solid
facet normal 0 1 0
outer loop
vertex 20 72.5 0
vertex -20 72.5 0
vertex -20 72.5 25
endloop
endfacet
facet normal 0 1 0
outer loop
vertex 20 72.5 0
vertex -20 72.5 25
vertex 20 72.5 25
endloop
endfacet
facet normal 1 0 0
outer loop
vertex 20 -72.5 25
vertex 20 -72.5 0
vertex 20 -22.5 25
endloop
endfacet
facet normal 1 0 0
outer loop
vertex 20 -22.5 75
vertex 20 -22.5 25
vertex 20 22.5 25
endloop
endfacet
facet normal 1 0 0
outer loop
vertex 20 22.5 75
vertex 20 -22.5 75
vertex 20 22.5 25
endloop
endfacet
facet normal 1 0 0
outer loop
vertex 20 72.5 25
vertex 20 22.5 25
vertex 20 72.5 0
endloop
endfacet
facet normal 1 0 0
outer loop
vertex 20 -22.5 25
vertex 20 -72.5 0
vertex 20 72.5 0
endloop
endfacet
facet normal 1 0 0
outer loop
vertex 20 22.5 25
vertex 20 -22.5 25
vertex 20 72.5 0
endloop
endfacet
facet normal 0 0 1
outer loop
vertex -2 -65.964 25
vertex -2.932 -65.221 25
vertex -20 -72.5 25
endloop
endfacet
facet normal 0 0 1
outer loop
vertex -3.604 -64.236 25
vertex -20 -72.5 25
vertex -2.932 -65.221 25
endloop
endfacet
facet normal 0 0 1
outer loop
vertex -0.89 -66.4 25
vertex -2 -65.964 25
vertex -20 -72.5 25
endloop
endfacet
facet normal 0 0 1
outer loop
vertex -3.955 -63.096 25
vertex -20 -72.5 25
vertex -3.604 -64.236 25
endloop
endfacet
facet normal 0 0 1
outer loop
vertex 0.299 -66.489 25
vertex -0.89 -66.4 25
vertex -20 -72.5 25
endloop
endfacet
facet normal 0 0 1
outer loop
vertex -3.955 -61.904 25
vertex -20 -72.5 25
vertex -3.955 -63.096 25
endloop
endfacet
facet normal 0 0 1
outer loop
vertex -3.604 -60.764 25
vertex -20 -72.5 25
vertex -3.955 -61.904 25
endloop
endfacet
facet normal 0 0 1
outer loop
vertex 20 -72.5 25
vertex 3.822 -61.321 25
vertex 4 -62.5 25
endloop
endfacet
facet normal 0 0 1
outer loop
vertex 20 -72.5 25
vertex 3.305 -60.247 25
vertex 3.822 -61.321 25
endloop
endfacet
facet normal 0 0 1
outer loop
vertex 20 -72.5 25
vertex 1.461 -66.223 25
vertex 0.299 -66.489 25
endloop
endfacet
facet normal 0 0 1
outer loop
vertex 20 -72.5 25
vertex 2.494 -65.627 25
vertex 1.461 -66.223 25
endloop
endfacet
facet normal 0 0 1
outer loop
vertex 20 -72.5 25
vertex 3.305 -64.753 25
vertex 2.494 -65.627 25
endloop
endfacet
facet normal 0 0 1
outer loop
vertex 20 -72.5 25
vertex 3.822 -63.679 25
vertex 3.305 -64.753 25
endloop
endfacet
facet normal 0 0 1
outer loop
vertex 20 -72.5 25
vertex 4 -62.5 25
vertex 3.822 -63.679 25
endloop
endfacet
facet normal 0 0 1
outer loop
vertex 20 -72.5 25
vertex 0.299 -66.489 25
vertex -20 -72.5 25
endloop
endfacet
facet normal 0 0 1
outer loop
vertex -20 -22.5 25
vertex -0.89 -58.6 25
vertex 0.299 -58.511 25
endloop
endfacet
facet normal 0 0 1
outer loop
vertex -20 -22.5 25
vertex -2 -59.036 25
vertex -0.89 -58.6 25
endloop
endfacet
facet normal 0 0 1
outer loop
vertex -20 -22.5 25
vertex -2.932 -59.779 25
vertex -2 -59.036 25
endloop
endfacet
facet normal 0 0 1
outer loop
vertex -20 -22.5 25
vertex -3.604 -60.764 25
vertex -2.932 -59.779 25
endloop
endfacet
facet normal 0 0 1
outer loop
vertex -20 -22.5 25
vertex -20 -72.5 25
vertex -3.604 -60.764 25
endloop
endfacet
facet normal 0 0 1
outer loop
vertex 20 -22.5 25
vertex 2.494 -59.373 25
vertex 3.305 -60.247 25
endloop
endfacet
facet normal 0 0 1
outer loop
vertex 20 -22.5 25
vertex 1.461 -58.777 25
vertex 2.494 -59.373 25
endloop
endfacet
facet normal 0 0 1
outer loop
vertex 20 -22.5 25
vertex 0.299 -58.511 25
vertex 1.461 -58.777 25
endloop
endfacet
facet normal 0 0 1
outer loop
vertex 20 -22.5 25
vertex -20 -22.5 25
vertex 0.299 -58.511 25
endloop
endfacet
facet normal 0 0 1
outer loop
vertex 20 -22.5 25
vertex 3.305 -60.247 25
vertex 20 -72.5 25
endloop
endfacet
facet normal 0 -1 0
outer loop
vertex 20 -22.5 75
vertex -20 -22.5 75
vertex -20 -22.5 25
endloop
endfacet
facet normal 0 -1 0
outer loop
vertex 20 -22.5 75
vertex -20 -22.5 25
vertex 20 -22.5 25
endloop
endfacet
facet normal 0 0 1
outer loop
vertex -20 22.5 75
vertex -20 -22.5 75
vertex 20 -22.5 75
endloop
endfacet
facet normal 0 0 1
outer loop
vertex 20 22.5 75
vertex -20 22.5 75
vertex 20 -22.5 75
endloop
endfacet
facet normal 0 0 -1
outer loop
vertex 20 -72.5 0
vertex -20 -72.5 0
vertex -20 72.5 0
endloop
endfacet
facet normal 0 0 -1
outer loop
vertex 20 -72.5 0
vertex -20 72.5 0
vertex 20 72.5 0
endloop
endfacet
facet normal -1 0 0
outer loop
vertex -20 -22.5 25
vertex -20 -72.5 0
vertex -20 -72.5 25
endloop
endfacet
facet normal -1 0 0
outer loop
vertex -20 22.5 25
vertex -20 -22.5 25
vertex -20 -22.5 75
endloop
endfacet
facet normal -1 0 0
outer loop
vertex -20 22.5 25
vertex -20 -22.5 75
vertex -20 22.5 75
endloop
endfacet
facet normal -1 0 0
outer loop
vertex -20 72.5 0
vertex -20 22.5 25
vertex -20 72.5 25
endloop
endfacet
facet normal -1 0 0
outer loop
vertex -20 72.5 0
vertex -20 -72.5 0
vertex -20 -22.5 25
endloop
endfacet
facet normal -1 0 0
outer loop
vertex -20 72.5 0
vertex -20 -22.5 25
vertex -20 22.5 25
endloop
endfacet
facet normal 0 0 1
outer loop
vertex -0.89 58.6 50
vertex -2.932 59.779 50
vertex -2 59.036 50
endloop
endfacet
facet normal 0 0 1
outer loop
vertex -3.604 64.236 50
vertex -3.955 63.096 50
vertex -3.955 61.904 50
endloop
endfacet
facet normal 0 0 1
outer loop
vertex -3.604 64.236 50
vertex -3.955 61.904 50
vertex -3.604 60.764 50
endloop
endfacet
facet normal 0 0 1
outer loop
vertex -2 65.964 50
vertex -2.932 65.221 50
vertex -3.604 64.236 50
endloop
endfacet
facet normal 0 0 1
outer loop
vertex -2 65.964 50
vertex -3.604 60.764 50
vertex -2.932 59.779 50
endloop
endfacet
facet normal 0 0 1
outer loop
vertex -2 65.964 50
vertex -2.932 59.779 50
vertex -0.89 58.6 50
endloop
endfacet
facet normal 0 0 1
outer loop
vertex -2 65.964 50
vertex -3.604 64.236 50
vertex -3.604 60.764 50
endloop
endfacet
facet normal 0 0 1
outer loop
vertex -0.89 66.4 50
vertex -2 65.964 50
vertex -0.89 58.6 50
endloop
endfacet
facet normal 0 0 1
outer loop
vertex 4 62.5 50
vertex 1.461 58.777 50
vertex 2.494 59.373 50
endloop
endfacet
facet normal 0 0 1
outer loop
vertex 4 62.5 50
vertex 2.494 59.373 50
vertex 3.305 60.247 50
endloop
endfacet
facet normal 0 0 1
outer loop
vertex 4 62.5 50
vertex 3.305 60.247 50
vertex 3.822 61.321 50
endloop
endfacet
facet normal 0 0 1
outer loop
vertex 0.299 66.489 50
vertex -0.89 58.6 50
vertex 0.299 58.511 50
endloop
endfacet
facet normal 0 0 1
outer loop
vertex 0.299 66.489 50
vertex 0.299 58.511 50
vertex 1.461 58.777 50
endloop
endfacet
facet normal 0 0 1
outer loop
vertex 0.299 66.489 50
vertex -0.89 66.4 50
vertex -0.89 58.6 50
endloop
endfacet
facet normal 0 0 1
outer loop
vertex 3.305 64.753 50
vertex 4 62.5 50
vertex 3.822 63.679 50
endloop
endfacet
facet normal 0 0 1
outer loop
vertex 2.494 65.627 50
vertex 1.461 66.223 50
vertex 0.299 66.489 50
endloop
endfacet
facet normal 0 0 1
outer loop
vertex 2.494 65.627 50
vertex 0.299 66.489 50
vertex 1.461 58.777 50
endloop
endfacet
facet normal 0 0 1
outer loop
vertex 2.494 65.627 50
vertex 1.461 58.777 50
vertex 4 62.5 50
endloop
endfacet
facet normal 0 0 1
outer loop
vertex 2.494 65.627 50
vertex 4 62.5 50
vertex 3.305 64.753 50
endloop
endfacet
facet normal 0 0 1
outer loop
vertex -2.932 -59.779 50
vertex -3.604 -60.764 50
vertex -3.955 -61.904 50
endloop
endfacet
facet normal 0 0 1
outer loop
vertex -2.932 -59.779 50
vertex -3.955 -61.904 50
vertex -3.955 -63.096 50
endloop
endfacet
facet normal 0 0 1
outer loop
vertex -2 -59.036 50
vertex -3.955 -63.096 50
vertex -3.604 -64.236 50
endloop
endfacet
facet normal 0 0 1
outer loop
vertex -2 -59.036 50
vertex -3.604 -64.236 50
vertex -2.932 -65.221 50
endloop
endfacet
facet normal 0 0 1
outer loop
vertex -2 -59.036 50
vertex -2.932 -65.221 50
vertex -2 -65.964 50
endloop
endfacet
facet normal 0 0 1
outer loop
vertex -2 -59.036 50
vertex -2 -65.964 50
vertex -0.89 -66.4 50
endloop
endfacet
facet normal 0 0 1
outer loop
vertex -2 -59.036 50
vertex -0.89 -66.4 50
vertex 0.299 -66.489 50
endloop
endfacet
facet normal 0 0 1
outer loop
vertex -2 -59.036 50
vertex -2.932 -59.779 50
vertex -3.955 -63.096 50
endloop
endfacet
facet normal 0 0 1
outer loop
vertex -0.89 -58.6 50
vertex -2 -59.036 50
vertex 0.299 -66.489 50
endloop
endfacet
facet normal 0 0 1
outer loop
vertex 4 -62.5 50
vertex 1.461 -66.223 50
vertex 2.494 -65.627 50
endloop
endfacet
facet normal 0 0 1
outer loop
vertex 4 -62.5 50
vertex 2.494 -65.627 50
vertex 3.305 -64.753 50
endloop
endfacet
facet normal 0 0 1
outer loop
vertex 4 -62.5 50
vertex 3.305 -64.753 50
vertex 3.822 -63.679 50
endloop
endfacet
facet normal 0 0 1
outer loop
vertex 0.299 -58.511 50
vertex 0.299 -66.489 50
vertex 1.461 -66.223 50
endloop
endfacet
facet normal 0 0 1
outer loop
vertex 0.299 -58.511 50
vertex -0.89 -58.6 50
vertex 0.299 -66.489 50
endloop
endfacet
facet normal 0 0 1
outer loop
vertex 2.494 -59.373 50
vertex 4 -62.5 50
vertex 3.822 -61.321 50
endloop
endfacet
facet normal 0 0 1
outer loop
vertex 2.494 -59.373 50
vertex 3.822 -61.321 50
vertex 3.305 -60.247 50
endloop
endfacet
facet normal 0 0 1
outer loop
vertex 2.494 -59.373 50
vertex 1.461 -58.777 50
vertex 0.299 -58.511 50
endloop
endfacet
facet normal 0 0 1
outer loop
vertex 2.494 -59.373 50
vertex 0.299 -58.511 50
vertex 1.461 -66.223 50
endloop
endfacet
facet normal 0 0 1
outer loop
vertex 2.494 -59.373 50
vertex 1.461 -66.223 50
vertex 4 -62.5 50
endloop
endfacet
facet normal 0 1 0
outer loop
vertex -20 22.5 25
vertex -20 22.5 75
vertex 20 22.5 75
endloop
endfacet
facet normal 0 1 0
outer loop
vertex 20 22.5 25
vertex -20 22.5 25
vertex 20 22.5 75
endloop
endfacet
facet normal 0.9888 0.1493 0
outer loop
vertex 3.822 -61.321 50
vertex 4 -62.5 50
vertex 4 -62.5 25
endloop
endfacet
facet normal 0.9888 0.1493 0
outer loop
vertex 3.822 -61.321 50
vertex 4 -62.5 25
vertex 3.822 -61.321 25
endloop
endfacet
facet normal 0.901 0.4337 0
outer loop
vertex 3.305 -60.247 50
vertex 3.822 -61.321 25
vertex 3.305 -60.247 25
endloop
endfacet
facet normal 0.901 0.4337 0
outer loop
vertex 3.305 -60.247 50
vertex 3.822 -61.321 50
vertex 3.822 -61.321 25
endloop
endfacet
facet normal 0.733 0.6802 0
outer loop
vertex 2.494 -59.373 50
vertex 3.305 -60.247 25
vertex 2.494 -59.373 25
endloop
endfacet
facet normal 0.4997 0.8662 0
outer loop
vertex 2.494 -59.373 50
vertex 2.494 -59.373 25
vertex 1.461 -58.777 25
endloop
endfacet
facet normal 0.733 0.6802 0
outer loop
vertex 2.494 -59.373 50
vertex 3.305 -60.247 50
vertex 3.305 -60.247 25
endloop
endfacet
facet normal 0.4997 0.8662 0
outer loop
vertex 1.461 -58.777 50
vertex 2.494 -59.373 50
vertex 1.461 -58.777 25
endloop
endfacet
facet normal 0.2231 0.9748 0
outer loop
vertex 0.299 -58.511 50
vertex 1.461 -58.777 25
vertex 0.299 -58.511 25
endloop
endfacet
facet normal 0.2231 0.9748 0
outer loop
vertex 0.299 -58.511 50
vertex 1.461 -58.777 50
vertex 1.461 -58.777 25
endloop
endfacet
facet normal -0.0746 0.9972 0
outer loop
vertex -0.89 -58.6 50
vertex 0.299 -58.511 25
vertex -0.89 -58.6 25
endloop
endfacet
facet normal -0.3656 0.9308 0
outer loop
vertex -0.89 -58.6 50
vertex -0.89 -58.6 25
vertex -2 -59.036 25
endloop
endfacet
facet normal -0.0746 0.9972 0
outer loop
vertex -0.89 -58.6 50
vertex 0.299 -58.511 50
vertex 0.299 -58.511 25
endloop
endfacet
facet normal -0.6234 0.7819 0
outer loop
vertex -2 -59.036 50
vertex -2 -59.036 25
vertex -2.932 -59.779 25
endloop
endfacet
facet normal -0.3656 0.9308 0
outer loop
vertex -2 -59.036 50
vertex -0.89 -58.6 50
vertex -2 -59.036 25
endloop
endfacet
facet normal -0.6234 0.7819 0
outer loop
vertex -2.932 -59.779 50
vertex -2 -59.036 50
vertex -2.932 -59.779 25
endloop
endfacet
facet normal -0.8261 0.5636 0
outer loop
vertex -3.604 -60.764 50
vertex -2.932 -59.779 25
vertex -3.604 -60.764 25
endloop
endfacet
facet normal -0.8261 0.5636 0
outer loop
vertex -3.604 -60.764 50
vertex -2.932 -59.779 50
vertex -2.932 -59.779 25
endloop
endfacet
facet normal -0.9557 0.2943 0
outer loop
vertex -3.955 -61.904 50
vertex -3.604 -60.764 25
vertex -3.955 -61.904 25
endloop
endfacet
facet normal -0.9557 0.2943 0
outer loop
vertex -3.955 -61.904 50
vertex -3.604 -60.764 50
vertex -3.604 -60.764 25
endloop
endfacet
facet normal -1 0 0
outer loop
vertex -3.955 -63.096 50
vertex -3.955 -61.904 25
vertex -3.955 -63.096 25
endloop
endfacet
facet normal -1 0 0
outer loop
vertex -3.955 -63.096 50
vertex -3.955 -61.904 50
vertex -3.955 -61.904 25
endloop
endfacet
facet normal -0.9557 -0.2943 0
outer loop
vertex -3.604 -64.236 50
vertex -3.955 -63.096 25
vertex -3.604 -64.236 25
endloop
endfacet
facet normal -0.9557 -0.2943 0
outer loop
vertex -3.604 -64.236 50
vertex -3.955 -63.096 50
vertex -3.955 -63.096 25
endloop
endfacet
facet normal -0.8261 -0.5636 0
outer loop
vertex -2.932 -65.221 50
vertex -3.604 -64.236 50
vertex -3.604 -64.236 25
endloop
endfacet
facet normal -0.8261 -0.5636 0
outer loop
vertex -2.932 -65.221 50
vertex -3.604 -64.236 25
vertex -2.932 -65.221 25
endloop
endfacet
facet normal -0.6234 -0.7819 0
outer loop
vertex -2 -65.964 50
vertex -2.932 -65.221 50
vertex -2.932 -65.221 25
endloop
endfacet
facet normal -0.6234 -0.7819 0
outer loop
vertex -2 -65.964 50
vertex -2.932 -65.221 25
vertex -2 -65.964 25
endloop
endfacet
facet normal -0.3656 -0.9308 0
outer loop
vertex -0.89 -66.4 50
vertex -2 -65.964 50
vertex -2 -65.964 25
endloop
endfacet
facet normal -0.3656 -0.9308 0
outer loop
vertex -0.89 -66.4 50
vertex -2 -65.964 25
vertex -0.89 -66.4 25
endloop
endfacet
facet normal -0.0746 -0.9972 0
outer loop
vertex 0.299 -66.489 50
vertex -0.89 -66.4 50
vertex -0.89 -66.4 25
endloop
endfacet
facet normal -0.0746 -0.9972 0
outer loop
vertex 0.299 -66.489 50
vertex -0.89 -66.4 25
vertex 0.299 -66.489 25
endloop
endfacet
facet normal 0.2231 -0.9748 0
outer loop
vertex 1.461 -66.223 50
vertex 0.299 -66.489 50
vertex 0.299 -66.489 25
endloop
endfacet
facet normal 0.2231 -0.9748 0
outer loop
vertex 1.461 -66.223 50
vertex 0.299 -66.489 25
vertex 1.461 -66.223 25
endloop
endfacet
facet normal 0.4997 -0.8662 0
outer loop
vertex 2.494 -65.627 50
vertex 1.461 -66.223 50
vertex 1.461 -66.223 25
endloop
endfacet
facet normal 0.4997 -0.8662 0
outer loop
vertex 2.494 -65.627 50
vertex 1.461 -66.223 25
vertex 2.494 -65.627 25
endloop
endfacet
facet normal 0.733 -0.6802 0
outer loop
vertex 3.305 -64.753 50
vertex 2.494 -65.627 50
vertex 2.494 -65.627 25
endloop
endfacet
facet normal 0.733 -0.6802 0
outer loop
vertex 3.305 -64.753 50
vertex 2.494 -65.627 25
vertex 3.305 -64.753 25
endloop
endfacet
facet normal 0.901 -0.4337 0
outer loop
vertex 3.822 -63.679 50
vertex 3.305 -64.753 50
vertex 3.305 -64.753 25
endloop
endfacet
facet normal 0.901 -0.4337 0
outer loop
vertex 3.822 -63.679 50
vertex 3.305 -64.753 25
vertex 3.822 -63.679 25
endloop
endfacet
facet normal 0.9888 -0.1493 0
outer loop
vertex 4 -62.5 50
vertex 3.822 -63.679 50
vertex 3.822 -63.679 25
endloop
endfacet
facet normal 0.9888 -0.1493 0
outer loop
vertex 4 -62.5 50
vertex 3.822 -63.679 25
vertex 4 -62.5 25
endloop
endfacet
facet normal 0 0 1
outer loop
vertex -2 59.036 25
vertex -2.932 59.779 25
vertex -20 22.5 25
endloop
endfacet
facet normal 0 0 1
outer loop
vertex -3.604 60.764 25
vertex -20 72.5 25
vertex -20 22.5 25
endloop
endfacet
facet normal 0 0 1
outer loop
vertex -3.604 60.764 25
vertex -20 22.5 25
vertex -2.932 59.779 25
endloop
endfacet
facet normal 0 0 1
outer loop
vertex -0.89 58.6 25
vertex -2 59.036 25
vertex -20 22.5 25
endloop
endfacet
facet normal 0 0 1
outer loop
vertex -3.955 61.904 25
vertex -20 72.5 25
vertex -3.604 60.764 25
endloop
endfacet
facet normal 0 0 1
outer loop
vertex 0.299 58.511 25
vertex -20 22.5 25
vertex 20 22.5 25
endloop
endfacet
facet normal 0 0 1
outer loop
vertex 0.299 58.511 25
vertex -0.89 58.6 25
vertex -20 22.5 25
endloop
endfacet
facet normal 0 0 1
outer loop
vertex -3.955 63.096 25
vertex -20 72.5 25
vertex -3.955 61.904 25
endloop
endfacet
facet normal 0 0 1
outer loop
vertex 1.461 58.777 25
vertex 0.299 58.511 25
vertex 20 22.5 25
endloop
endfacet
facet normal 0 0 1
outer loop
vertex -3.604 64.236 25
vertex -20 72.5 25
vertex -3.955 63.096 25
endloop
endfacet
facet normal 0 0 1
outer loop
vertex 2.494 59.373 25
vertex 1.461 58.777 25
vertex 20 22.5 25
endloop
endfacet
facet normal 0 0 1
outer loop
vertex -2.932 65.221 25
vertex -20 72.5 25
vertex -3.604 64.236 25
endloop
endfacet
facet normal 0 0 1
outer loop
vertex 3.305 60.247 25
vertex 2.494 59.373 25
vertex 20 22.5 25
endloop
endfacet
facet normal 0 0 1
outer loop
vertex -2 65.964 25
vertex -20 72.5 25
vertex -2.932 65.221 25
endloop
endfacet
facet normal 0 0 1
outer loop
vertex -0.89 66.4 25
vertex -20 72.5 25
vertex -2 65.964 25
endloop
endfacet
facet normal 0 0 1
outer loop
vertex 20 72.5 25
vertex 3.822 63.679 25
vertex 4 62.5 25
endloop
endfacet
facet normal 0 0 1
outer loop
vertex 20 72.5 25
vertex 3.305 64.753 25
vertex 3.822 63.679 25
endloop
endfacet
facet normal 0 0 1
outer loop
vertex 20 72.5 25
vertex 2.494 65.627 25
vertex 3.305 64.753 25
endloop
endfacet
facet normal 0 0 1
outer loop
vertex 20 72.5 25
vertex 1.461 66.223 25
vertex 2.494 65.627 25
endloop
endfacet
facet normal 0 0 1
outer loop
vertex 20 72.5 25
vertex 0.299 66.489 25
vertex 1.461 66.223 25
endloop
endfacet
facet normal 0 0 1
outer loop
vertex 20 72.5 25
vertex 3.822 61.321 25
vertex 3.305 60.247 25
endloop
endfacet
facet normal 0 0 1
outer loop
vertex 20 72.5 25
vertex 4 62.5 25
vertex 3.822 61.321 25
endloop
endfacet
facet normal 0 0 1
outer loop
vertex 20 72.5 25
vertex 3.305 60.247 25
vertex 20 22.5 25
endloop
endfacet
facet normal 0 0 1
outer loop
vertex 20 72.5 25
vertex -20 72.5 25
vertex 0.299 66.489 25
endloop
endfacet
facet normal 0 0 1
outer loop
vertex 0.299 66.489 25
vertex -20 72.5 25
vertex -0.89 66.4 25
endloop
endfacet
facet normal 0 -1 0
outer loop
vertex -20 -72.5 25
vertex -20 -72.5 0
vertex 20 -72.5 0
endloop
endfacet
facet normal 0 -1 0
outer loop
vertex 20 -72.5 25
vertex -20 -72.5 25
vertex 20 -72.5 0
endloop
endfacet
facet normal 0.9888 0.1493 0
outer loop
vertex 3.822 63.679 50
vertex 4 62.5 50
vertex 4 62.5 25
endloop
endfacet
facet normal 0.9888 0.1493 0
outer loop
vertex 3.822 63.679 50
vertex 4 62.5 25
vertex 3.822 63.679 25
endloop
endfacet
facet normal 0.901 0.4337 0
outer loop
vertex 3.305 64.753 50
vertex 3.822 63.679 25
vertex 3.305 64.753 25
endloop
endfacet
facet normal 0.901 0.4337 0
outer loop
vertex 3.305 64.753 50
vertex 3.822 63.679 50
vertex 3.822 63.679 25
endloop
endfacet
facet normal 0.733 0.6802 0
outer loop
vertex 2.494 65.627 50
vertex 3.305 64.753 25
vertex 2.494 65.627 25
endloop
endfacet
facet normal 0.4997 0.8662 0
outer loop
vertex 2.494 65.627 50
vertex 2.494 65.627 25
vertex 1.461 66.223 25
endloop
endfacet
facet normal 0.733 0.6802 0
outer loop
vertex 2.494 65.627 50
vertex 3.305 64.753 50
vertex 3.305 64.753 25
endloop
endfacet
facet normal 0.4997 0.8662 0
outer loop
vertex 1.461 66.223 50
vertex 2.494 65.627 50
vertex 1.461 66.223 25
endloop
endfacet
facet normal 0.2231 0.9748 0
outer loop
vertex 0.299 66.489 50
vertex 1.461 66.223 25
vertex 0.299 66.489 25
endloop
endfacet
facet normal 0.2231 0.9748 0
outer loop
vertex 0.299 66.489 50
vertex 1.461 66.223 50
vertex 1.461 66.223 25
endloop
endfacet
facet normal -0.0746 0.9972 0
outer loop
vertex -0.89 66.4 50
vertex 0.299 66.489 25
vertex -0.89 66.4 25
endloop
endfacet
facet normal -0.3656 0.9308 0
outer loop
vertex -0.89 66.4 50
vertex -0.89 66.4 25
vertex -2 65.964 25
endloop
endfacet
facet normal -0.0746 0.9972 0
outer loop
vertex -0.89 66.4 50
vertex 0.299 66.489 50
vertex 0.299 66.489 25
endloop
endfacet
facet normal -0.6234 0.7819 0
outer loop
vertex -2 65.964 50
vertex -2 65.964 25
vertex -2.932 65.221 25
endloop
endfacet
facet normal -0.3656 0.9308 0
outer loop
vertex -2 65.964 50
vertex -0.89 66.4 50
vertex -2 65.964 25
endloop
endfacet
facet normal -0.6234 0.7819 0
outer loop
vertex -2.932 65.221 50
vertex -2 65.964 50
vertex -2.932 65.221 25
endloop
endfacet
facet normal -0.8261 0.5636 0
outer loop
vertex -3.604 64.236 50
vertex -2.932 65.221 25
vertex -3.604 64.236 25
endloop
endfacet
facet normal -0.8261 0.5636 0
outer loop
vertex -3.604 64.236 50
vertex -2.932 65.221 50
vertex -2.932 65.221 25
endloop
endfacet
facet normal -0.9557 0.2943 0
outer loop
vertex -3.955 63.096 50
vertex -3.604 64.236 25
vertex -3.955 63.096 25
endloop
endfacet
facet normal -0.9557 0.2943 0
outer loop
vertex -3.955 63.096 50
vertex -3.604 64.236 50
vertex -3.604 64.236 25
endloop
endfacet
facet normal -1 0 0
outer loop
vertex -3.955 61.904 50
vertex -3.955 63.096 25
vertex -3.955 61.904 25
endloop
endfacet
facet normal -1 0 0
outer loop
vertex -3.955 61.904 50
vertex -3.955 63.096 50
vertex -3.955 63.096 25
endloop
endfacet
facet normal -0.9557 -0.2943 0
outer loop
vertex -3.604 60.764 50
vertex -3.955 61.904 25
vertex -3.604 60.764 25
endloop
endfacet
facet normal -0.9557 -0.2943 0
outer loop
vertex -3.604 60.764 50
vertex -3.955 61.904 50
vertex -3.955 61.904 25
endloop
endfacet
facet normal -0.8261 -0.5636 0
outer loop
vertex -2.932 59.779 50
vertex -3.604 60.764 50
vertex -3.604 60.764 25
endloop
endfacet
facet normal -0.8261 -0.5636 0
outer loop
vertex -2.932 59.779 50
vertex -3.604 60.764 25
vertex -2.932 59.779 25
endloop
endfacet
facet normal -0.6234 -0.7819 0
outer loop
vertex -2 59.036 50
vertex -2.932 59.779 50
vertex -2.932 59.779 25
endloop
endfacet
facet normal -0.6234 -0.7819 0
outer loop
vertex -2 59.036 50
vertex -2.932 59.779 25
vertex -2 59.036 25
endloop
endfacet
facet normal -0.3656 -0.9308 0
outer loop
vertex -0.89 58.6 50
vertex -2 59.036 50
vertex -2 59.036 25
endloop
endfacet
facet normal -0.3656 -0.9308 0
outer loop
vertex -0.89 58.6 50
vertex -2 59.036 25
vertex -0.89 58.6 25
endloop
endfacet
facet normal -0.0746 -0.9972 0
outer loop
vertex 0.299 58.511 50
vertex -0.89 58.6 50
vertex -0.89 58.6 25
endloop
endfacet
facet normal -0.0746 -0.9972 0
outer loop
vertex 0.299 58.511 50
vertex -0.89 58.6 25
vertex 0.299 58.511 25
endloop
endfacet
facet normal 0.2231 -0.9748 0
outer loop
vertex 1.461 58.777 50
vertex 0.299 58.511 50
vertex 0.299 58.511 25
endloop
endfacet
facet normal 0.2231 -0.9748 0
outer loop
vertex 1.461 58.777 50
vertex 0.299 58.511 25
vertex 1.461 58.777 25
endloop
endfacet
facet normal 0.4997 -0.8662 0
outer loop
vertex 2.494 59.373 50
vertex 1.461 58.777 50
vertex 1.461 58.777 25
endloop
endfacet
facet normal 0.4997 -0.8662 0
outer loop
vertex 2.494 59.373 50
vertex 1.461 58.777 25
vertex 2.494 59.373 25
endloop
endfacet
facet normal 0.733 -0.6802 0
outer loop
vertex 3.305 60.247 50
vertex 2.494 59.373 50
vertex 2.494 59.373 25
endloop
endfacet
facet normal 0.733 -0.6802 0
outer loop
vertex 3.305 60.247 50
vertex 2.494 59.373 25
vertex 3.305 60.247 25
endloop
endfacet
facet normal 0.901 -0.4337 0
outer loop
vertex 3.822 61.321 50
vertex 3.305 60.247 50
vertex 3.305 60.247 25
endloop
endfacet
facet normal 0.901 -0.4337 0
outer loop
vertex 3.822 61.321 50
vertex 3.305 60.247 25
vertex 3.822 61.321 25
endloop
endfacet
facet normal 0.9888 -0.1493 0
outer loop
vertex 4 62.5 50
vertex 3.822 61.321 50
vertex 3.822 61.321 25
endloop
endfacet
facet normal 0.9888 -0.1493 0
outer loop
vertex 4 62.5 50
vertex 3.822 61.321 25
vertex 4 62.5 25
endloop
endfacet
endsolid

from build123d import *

# Parameters (mm, degrees)
F0_W     = 40
F0_H     = 145
F1_DEPTH = 75
F2_W     = 40
F2_H     = 50
F2_R     = 4
F3_DEPTH = 50
F4_R     = 4.542439
F4_R_2   = 4.801552
F5_DEPTH = 25


with BuildPart() as f1:
    # F0 (on Top) → F1 (new body)
    with BuildSketch(Plane.XY):
        Rectangle(F0_W, F0_H)
    extrude(amount=F1_DEPTH)

    # F2 (on face) → F3 (cut)
    with BuildSketch(Plane.XY.offset(75)):
        with Locations((0, -47.5)):
            Rectangle(F2_W, F2_H)
        with Locations((0, -62.5)):
            Circle(F2_R, mode=Mode.SUBTRACT)
        with Locations((0, 47.5)):
            Rectangle(F2_W, F2_H)
        with Locations((0, 62.5)):
            Circle(F2_R, mode=Mode.SUBTRACT)
    extrude(amount=-F3_DEPTH, mode=Mode.SUBTRACT)

    # F4 (on face) → F5 (cut)
    with BuildSketch(Plane.XY.offset(75)):
        with Locations((0, 62.5)):
            Circle(F4_R)
        with Locations((0, -62.5)):
            Circle(F4_R_2)
    extrude(amount=-F5_DEPTH, mode=Mode.SUBTRACT)


solid = f1.part
